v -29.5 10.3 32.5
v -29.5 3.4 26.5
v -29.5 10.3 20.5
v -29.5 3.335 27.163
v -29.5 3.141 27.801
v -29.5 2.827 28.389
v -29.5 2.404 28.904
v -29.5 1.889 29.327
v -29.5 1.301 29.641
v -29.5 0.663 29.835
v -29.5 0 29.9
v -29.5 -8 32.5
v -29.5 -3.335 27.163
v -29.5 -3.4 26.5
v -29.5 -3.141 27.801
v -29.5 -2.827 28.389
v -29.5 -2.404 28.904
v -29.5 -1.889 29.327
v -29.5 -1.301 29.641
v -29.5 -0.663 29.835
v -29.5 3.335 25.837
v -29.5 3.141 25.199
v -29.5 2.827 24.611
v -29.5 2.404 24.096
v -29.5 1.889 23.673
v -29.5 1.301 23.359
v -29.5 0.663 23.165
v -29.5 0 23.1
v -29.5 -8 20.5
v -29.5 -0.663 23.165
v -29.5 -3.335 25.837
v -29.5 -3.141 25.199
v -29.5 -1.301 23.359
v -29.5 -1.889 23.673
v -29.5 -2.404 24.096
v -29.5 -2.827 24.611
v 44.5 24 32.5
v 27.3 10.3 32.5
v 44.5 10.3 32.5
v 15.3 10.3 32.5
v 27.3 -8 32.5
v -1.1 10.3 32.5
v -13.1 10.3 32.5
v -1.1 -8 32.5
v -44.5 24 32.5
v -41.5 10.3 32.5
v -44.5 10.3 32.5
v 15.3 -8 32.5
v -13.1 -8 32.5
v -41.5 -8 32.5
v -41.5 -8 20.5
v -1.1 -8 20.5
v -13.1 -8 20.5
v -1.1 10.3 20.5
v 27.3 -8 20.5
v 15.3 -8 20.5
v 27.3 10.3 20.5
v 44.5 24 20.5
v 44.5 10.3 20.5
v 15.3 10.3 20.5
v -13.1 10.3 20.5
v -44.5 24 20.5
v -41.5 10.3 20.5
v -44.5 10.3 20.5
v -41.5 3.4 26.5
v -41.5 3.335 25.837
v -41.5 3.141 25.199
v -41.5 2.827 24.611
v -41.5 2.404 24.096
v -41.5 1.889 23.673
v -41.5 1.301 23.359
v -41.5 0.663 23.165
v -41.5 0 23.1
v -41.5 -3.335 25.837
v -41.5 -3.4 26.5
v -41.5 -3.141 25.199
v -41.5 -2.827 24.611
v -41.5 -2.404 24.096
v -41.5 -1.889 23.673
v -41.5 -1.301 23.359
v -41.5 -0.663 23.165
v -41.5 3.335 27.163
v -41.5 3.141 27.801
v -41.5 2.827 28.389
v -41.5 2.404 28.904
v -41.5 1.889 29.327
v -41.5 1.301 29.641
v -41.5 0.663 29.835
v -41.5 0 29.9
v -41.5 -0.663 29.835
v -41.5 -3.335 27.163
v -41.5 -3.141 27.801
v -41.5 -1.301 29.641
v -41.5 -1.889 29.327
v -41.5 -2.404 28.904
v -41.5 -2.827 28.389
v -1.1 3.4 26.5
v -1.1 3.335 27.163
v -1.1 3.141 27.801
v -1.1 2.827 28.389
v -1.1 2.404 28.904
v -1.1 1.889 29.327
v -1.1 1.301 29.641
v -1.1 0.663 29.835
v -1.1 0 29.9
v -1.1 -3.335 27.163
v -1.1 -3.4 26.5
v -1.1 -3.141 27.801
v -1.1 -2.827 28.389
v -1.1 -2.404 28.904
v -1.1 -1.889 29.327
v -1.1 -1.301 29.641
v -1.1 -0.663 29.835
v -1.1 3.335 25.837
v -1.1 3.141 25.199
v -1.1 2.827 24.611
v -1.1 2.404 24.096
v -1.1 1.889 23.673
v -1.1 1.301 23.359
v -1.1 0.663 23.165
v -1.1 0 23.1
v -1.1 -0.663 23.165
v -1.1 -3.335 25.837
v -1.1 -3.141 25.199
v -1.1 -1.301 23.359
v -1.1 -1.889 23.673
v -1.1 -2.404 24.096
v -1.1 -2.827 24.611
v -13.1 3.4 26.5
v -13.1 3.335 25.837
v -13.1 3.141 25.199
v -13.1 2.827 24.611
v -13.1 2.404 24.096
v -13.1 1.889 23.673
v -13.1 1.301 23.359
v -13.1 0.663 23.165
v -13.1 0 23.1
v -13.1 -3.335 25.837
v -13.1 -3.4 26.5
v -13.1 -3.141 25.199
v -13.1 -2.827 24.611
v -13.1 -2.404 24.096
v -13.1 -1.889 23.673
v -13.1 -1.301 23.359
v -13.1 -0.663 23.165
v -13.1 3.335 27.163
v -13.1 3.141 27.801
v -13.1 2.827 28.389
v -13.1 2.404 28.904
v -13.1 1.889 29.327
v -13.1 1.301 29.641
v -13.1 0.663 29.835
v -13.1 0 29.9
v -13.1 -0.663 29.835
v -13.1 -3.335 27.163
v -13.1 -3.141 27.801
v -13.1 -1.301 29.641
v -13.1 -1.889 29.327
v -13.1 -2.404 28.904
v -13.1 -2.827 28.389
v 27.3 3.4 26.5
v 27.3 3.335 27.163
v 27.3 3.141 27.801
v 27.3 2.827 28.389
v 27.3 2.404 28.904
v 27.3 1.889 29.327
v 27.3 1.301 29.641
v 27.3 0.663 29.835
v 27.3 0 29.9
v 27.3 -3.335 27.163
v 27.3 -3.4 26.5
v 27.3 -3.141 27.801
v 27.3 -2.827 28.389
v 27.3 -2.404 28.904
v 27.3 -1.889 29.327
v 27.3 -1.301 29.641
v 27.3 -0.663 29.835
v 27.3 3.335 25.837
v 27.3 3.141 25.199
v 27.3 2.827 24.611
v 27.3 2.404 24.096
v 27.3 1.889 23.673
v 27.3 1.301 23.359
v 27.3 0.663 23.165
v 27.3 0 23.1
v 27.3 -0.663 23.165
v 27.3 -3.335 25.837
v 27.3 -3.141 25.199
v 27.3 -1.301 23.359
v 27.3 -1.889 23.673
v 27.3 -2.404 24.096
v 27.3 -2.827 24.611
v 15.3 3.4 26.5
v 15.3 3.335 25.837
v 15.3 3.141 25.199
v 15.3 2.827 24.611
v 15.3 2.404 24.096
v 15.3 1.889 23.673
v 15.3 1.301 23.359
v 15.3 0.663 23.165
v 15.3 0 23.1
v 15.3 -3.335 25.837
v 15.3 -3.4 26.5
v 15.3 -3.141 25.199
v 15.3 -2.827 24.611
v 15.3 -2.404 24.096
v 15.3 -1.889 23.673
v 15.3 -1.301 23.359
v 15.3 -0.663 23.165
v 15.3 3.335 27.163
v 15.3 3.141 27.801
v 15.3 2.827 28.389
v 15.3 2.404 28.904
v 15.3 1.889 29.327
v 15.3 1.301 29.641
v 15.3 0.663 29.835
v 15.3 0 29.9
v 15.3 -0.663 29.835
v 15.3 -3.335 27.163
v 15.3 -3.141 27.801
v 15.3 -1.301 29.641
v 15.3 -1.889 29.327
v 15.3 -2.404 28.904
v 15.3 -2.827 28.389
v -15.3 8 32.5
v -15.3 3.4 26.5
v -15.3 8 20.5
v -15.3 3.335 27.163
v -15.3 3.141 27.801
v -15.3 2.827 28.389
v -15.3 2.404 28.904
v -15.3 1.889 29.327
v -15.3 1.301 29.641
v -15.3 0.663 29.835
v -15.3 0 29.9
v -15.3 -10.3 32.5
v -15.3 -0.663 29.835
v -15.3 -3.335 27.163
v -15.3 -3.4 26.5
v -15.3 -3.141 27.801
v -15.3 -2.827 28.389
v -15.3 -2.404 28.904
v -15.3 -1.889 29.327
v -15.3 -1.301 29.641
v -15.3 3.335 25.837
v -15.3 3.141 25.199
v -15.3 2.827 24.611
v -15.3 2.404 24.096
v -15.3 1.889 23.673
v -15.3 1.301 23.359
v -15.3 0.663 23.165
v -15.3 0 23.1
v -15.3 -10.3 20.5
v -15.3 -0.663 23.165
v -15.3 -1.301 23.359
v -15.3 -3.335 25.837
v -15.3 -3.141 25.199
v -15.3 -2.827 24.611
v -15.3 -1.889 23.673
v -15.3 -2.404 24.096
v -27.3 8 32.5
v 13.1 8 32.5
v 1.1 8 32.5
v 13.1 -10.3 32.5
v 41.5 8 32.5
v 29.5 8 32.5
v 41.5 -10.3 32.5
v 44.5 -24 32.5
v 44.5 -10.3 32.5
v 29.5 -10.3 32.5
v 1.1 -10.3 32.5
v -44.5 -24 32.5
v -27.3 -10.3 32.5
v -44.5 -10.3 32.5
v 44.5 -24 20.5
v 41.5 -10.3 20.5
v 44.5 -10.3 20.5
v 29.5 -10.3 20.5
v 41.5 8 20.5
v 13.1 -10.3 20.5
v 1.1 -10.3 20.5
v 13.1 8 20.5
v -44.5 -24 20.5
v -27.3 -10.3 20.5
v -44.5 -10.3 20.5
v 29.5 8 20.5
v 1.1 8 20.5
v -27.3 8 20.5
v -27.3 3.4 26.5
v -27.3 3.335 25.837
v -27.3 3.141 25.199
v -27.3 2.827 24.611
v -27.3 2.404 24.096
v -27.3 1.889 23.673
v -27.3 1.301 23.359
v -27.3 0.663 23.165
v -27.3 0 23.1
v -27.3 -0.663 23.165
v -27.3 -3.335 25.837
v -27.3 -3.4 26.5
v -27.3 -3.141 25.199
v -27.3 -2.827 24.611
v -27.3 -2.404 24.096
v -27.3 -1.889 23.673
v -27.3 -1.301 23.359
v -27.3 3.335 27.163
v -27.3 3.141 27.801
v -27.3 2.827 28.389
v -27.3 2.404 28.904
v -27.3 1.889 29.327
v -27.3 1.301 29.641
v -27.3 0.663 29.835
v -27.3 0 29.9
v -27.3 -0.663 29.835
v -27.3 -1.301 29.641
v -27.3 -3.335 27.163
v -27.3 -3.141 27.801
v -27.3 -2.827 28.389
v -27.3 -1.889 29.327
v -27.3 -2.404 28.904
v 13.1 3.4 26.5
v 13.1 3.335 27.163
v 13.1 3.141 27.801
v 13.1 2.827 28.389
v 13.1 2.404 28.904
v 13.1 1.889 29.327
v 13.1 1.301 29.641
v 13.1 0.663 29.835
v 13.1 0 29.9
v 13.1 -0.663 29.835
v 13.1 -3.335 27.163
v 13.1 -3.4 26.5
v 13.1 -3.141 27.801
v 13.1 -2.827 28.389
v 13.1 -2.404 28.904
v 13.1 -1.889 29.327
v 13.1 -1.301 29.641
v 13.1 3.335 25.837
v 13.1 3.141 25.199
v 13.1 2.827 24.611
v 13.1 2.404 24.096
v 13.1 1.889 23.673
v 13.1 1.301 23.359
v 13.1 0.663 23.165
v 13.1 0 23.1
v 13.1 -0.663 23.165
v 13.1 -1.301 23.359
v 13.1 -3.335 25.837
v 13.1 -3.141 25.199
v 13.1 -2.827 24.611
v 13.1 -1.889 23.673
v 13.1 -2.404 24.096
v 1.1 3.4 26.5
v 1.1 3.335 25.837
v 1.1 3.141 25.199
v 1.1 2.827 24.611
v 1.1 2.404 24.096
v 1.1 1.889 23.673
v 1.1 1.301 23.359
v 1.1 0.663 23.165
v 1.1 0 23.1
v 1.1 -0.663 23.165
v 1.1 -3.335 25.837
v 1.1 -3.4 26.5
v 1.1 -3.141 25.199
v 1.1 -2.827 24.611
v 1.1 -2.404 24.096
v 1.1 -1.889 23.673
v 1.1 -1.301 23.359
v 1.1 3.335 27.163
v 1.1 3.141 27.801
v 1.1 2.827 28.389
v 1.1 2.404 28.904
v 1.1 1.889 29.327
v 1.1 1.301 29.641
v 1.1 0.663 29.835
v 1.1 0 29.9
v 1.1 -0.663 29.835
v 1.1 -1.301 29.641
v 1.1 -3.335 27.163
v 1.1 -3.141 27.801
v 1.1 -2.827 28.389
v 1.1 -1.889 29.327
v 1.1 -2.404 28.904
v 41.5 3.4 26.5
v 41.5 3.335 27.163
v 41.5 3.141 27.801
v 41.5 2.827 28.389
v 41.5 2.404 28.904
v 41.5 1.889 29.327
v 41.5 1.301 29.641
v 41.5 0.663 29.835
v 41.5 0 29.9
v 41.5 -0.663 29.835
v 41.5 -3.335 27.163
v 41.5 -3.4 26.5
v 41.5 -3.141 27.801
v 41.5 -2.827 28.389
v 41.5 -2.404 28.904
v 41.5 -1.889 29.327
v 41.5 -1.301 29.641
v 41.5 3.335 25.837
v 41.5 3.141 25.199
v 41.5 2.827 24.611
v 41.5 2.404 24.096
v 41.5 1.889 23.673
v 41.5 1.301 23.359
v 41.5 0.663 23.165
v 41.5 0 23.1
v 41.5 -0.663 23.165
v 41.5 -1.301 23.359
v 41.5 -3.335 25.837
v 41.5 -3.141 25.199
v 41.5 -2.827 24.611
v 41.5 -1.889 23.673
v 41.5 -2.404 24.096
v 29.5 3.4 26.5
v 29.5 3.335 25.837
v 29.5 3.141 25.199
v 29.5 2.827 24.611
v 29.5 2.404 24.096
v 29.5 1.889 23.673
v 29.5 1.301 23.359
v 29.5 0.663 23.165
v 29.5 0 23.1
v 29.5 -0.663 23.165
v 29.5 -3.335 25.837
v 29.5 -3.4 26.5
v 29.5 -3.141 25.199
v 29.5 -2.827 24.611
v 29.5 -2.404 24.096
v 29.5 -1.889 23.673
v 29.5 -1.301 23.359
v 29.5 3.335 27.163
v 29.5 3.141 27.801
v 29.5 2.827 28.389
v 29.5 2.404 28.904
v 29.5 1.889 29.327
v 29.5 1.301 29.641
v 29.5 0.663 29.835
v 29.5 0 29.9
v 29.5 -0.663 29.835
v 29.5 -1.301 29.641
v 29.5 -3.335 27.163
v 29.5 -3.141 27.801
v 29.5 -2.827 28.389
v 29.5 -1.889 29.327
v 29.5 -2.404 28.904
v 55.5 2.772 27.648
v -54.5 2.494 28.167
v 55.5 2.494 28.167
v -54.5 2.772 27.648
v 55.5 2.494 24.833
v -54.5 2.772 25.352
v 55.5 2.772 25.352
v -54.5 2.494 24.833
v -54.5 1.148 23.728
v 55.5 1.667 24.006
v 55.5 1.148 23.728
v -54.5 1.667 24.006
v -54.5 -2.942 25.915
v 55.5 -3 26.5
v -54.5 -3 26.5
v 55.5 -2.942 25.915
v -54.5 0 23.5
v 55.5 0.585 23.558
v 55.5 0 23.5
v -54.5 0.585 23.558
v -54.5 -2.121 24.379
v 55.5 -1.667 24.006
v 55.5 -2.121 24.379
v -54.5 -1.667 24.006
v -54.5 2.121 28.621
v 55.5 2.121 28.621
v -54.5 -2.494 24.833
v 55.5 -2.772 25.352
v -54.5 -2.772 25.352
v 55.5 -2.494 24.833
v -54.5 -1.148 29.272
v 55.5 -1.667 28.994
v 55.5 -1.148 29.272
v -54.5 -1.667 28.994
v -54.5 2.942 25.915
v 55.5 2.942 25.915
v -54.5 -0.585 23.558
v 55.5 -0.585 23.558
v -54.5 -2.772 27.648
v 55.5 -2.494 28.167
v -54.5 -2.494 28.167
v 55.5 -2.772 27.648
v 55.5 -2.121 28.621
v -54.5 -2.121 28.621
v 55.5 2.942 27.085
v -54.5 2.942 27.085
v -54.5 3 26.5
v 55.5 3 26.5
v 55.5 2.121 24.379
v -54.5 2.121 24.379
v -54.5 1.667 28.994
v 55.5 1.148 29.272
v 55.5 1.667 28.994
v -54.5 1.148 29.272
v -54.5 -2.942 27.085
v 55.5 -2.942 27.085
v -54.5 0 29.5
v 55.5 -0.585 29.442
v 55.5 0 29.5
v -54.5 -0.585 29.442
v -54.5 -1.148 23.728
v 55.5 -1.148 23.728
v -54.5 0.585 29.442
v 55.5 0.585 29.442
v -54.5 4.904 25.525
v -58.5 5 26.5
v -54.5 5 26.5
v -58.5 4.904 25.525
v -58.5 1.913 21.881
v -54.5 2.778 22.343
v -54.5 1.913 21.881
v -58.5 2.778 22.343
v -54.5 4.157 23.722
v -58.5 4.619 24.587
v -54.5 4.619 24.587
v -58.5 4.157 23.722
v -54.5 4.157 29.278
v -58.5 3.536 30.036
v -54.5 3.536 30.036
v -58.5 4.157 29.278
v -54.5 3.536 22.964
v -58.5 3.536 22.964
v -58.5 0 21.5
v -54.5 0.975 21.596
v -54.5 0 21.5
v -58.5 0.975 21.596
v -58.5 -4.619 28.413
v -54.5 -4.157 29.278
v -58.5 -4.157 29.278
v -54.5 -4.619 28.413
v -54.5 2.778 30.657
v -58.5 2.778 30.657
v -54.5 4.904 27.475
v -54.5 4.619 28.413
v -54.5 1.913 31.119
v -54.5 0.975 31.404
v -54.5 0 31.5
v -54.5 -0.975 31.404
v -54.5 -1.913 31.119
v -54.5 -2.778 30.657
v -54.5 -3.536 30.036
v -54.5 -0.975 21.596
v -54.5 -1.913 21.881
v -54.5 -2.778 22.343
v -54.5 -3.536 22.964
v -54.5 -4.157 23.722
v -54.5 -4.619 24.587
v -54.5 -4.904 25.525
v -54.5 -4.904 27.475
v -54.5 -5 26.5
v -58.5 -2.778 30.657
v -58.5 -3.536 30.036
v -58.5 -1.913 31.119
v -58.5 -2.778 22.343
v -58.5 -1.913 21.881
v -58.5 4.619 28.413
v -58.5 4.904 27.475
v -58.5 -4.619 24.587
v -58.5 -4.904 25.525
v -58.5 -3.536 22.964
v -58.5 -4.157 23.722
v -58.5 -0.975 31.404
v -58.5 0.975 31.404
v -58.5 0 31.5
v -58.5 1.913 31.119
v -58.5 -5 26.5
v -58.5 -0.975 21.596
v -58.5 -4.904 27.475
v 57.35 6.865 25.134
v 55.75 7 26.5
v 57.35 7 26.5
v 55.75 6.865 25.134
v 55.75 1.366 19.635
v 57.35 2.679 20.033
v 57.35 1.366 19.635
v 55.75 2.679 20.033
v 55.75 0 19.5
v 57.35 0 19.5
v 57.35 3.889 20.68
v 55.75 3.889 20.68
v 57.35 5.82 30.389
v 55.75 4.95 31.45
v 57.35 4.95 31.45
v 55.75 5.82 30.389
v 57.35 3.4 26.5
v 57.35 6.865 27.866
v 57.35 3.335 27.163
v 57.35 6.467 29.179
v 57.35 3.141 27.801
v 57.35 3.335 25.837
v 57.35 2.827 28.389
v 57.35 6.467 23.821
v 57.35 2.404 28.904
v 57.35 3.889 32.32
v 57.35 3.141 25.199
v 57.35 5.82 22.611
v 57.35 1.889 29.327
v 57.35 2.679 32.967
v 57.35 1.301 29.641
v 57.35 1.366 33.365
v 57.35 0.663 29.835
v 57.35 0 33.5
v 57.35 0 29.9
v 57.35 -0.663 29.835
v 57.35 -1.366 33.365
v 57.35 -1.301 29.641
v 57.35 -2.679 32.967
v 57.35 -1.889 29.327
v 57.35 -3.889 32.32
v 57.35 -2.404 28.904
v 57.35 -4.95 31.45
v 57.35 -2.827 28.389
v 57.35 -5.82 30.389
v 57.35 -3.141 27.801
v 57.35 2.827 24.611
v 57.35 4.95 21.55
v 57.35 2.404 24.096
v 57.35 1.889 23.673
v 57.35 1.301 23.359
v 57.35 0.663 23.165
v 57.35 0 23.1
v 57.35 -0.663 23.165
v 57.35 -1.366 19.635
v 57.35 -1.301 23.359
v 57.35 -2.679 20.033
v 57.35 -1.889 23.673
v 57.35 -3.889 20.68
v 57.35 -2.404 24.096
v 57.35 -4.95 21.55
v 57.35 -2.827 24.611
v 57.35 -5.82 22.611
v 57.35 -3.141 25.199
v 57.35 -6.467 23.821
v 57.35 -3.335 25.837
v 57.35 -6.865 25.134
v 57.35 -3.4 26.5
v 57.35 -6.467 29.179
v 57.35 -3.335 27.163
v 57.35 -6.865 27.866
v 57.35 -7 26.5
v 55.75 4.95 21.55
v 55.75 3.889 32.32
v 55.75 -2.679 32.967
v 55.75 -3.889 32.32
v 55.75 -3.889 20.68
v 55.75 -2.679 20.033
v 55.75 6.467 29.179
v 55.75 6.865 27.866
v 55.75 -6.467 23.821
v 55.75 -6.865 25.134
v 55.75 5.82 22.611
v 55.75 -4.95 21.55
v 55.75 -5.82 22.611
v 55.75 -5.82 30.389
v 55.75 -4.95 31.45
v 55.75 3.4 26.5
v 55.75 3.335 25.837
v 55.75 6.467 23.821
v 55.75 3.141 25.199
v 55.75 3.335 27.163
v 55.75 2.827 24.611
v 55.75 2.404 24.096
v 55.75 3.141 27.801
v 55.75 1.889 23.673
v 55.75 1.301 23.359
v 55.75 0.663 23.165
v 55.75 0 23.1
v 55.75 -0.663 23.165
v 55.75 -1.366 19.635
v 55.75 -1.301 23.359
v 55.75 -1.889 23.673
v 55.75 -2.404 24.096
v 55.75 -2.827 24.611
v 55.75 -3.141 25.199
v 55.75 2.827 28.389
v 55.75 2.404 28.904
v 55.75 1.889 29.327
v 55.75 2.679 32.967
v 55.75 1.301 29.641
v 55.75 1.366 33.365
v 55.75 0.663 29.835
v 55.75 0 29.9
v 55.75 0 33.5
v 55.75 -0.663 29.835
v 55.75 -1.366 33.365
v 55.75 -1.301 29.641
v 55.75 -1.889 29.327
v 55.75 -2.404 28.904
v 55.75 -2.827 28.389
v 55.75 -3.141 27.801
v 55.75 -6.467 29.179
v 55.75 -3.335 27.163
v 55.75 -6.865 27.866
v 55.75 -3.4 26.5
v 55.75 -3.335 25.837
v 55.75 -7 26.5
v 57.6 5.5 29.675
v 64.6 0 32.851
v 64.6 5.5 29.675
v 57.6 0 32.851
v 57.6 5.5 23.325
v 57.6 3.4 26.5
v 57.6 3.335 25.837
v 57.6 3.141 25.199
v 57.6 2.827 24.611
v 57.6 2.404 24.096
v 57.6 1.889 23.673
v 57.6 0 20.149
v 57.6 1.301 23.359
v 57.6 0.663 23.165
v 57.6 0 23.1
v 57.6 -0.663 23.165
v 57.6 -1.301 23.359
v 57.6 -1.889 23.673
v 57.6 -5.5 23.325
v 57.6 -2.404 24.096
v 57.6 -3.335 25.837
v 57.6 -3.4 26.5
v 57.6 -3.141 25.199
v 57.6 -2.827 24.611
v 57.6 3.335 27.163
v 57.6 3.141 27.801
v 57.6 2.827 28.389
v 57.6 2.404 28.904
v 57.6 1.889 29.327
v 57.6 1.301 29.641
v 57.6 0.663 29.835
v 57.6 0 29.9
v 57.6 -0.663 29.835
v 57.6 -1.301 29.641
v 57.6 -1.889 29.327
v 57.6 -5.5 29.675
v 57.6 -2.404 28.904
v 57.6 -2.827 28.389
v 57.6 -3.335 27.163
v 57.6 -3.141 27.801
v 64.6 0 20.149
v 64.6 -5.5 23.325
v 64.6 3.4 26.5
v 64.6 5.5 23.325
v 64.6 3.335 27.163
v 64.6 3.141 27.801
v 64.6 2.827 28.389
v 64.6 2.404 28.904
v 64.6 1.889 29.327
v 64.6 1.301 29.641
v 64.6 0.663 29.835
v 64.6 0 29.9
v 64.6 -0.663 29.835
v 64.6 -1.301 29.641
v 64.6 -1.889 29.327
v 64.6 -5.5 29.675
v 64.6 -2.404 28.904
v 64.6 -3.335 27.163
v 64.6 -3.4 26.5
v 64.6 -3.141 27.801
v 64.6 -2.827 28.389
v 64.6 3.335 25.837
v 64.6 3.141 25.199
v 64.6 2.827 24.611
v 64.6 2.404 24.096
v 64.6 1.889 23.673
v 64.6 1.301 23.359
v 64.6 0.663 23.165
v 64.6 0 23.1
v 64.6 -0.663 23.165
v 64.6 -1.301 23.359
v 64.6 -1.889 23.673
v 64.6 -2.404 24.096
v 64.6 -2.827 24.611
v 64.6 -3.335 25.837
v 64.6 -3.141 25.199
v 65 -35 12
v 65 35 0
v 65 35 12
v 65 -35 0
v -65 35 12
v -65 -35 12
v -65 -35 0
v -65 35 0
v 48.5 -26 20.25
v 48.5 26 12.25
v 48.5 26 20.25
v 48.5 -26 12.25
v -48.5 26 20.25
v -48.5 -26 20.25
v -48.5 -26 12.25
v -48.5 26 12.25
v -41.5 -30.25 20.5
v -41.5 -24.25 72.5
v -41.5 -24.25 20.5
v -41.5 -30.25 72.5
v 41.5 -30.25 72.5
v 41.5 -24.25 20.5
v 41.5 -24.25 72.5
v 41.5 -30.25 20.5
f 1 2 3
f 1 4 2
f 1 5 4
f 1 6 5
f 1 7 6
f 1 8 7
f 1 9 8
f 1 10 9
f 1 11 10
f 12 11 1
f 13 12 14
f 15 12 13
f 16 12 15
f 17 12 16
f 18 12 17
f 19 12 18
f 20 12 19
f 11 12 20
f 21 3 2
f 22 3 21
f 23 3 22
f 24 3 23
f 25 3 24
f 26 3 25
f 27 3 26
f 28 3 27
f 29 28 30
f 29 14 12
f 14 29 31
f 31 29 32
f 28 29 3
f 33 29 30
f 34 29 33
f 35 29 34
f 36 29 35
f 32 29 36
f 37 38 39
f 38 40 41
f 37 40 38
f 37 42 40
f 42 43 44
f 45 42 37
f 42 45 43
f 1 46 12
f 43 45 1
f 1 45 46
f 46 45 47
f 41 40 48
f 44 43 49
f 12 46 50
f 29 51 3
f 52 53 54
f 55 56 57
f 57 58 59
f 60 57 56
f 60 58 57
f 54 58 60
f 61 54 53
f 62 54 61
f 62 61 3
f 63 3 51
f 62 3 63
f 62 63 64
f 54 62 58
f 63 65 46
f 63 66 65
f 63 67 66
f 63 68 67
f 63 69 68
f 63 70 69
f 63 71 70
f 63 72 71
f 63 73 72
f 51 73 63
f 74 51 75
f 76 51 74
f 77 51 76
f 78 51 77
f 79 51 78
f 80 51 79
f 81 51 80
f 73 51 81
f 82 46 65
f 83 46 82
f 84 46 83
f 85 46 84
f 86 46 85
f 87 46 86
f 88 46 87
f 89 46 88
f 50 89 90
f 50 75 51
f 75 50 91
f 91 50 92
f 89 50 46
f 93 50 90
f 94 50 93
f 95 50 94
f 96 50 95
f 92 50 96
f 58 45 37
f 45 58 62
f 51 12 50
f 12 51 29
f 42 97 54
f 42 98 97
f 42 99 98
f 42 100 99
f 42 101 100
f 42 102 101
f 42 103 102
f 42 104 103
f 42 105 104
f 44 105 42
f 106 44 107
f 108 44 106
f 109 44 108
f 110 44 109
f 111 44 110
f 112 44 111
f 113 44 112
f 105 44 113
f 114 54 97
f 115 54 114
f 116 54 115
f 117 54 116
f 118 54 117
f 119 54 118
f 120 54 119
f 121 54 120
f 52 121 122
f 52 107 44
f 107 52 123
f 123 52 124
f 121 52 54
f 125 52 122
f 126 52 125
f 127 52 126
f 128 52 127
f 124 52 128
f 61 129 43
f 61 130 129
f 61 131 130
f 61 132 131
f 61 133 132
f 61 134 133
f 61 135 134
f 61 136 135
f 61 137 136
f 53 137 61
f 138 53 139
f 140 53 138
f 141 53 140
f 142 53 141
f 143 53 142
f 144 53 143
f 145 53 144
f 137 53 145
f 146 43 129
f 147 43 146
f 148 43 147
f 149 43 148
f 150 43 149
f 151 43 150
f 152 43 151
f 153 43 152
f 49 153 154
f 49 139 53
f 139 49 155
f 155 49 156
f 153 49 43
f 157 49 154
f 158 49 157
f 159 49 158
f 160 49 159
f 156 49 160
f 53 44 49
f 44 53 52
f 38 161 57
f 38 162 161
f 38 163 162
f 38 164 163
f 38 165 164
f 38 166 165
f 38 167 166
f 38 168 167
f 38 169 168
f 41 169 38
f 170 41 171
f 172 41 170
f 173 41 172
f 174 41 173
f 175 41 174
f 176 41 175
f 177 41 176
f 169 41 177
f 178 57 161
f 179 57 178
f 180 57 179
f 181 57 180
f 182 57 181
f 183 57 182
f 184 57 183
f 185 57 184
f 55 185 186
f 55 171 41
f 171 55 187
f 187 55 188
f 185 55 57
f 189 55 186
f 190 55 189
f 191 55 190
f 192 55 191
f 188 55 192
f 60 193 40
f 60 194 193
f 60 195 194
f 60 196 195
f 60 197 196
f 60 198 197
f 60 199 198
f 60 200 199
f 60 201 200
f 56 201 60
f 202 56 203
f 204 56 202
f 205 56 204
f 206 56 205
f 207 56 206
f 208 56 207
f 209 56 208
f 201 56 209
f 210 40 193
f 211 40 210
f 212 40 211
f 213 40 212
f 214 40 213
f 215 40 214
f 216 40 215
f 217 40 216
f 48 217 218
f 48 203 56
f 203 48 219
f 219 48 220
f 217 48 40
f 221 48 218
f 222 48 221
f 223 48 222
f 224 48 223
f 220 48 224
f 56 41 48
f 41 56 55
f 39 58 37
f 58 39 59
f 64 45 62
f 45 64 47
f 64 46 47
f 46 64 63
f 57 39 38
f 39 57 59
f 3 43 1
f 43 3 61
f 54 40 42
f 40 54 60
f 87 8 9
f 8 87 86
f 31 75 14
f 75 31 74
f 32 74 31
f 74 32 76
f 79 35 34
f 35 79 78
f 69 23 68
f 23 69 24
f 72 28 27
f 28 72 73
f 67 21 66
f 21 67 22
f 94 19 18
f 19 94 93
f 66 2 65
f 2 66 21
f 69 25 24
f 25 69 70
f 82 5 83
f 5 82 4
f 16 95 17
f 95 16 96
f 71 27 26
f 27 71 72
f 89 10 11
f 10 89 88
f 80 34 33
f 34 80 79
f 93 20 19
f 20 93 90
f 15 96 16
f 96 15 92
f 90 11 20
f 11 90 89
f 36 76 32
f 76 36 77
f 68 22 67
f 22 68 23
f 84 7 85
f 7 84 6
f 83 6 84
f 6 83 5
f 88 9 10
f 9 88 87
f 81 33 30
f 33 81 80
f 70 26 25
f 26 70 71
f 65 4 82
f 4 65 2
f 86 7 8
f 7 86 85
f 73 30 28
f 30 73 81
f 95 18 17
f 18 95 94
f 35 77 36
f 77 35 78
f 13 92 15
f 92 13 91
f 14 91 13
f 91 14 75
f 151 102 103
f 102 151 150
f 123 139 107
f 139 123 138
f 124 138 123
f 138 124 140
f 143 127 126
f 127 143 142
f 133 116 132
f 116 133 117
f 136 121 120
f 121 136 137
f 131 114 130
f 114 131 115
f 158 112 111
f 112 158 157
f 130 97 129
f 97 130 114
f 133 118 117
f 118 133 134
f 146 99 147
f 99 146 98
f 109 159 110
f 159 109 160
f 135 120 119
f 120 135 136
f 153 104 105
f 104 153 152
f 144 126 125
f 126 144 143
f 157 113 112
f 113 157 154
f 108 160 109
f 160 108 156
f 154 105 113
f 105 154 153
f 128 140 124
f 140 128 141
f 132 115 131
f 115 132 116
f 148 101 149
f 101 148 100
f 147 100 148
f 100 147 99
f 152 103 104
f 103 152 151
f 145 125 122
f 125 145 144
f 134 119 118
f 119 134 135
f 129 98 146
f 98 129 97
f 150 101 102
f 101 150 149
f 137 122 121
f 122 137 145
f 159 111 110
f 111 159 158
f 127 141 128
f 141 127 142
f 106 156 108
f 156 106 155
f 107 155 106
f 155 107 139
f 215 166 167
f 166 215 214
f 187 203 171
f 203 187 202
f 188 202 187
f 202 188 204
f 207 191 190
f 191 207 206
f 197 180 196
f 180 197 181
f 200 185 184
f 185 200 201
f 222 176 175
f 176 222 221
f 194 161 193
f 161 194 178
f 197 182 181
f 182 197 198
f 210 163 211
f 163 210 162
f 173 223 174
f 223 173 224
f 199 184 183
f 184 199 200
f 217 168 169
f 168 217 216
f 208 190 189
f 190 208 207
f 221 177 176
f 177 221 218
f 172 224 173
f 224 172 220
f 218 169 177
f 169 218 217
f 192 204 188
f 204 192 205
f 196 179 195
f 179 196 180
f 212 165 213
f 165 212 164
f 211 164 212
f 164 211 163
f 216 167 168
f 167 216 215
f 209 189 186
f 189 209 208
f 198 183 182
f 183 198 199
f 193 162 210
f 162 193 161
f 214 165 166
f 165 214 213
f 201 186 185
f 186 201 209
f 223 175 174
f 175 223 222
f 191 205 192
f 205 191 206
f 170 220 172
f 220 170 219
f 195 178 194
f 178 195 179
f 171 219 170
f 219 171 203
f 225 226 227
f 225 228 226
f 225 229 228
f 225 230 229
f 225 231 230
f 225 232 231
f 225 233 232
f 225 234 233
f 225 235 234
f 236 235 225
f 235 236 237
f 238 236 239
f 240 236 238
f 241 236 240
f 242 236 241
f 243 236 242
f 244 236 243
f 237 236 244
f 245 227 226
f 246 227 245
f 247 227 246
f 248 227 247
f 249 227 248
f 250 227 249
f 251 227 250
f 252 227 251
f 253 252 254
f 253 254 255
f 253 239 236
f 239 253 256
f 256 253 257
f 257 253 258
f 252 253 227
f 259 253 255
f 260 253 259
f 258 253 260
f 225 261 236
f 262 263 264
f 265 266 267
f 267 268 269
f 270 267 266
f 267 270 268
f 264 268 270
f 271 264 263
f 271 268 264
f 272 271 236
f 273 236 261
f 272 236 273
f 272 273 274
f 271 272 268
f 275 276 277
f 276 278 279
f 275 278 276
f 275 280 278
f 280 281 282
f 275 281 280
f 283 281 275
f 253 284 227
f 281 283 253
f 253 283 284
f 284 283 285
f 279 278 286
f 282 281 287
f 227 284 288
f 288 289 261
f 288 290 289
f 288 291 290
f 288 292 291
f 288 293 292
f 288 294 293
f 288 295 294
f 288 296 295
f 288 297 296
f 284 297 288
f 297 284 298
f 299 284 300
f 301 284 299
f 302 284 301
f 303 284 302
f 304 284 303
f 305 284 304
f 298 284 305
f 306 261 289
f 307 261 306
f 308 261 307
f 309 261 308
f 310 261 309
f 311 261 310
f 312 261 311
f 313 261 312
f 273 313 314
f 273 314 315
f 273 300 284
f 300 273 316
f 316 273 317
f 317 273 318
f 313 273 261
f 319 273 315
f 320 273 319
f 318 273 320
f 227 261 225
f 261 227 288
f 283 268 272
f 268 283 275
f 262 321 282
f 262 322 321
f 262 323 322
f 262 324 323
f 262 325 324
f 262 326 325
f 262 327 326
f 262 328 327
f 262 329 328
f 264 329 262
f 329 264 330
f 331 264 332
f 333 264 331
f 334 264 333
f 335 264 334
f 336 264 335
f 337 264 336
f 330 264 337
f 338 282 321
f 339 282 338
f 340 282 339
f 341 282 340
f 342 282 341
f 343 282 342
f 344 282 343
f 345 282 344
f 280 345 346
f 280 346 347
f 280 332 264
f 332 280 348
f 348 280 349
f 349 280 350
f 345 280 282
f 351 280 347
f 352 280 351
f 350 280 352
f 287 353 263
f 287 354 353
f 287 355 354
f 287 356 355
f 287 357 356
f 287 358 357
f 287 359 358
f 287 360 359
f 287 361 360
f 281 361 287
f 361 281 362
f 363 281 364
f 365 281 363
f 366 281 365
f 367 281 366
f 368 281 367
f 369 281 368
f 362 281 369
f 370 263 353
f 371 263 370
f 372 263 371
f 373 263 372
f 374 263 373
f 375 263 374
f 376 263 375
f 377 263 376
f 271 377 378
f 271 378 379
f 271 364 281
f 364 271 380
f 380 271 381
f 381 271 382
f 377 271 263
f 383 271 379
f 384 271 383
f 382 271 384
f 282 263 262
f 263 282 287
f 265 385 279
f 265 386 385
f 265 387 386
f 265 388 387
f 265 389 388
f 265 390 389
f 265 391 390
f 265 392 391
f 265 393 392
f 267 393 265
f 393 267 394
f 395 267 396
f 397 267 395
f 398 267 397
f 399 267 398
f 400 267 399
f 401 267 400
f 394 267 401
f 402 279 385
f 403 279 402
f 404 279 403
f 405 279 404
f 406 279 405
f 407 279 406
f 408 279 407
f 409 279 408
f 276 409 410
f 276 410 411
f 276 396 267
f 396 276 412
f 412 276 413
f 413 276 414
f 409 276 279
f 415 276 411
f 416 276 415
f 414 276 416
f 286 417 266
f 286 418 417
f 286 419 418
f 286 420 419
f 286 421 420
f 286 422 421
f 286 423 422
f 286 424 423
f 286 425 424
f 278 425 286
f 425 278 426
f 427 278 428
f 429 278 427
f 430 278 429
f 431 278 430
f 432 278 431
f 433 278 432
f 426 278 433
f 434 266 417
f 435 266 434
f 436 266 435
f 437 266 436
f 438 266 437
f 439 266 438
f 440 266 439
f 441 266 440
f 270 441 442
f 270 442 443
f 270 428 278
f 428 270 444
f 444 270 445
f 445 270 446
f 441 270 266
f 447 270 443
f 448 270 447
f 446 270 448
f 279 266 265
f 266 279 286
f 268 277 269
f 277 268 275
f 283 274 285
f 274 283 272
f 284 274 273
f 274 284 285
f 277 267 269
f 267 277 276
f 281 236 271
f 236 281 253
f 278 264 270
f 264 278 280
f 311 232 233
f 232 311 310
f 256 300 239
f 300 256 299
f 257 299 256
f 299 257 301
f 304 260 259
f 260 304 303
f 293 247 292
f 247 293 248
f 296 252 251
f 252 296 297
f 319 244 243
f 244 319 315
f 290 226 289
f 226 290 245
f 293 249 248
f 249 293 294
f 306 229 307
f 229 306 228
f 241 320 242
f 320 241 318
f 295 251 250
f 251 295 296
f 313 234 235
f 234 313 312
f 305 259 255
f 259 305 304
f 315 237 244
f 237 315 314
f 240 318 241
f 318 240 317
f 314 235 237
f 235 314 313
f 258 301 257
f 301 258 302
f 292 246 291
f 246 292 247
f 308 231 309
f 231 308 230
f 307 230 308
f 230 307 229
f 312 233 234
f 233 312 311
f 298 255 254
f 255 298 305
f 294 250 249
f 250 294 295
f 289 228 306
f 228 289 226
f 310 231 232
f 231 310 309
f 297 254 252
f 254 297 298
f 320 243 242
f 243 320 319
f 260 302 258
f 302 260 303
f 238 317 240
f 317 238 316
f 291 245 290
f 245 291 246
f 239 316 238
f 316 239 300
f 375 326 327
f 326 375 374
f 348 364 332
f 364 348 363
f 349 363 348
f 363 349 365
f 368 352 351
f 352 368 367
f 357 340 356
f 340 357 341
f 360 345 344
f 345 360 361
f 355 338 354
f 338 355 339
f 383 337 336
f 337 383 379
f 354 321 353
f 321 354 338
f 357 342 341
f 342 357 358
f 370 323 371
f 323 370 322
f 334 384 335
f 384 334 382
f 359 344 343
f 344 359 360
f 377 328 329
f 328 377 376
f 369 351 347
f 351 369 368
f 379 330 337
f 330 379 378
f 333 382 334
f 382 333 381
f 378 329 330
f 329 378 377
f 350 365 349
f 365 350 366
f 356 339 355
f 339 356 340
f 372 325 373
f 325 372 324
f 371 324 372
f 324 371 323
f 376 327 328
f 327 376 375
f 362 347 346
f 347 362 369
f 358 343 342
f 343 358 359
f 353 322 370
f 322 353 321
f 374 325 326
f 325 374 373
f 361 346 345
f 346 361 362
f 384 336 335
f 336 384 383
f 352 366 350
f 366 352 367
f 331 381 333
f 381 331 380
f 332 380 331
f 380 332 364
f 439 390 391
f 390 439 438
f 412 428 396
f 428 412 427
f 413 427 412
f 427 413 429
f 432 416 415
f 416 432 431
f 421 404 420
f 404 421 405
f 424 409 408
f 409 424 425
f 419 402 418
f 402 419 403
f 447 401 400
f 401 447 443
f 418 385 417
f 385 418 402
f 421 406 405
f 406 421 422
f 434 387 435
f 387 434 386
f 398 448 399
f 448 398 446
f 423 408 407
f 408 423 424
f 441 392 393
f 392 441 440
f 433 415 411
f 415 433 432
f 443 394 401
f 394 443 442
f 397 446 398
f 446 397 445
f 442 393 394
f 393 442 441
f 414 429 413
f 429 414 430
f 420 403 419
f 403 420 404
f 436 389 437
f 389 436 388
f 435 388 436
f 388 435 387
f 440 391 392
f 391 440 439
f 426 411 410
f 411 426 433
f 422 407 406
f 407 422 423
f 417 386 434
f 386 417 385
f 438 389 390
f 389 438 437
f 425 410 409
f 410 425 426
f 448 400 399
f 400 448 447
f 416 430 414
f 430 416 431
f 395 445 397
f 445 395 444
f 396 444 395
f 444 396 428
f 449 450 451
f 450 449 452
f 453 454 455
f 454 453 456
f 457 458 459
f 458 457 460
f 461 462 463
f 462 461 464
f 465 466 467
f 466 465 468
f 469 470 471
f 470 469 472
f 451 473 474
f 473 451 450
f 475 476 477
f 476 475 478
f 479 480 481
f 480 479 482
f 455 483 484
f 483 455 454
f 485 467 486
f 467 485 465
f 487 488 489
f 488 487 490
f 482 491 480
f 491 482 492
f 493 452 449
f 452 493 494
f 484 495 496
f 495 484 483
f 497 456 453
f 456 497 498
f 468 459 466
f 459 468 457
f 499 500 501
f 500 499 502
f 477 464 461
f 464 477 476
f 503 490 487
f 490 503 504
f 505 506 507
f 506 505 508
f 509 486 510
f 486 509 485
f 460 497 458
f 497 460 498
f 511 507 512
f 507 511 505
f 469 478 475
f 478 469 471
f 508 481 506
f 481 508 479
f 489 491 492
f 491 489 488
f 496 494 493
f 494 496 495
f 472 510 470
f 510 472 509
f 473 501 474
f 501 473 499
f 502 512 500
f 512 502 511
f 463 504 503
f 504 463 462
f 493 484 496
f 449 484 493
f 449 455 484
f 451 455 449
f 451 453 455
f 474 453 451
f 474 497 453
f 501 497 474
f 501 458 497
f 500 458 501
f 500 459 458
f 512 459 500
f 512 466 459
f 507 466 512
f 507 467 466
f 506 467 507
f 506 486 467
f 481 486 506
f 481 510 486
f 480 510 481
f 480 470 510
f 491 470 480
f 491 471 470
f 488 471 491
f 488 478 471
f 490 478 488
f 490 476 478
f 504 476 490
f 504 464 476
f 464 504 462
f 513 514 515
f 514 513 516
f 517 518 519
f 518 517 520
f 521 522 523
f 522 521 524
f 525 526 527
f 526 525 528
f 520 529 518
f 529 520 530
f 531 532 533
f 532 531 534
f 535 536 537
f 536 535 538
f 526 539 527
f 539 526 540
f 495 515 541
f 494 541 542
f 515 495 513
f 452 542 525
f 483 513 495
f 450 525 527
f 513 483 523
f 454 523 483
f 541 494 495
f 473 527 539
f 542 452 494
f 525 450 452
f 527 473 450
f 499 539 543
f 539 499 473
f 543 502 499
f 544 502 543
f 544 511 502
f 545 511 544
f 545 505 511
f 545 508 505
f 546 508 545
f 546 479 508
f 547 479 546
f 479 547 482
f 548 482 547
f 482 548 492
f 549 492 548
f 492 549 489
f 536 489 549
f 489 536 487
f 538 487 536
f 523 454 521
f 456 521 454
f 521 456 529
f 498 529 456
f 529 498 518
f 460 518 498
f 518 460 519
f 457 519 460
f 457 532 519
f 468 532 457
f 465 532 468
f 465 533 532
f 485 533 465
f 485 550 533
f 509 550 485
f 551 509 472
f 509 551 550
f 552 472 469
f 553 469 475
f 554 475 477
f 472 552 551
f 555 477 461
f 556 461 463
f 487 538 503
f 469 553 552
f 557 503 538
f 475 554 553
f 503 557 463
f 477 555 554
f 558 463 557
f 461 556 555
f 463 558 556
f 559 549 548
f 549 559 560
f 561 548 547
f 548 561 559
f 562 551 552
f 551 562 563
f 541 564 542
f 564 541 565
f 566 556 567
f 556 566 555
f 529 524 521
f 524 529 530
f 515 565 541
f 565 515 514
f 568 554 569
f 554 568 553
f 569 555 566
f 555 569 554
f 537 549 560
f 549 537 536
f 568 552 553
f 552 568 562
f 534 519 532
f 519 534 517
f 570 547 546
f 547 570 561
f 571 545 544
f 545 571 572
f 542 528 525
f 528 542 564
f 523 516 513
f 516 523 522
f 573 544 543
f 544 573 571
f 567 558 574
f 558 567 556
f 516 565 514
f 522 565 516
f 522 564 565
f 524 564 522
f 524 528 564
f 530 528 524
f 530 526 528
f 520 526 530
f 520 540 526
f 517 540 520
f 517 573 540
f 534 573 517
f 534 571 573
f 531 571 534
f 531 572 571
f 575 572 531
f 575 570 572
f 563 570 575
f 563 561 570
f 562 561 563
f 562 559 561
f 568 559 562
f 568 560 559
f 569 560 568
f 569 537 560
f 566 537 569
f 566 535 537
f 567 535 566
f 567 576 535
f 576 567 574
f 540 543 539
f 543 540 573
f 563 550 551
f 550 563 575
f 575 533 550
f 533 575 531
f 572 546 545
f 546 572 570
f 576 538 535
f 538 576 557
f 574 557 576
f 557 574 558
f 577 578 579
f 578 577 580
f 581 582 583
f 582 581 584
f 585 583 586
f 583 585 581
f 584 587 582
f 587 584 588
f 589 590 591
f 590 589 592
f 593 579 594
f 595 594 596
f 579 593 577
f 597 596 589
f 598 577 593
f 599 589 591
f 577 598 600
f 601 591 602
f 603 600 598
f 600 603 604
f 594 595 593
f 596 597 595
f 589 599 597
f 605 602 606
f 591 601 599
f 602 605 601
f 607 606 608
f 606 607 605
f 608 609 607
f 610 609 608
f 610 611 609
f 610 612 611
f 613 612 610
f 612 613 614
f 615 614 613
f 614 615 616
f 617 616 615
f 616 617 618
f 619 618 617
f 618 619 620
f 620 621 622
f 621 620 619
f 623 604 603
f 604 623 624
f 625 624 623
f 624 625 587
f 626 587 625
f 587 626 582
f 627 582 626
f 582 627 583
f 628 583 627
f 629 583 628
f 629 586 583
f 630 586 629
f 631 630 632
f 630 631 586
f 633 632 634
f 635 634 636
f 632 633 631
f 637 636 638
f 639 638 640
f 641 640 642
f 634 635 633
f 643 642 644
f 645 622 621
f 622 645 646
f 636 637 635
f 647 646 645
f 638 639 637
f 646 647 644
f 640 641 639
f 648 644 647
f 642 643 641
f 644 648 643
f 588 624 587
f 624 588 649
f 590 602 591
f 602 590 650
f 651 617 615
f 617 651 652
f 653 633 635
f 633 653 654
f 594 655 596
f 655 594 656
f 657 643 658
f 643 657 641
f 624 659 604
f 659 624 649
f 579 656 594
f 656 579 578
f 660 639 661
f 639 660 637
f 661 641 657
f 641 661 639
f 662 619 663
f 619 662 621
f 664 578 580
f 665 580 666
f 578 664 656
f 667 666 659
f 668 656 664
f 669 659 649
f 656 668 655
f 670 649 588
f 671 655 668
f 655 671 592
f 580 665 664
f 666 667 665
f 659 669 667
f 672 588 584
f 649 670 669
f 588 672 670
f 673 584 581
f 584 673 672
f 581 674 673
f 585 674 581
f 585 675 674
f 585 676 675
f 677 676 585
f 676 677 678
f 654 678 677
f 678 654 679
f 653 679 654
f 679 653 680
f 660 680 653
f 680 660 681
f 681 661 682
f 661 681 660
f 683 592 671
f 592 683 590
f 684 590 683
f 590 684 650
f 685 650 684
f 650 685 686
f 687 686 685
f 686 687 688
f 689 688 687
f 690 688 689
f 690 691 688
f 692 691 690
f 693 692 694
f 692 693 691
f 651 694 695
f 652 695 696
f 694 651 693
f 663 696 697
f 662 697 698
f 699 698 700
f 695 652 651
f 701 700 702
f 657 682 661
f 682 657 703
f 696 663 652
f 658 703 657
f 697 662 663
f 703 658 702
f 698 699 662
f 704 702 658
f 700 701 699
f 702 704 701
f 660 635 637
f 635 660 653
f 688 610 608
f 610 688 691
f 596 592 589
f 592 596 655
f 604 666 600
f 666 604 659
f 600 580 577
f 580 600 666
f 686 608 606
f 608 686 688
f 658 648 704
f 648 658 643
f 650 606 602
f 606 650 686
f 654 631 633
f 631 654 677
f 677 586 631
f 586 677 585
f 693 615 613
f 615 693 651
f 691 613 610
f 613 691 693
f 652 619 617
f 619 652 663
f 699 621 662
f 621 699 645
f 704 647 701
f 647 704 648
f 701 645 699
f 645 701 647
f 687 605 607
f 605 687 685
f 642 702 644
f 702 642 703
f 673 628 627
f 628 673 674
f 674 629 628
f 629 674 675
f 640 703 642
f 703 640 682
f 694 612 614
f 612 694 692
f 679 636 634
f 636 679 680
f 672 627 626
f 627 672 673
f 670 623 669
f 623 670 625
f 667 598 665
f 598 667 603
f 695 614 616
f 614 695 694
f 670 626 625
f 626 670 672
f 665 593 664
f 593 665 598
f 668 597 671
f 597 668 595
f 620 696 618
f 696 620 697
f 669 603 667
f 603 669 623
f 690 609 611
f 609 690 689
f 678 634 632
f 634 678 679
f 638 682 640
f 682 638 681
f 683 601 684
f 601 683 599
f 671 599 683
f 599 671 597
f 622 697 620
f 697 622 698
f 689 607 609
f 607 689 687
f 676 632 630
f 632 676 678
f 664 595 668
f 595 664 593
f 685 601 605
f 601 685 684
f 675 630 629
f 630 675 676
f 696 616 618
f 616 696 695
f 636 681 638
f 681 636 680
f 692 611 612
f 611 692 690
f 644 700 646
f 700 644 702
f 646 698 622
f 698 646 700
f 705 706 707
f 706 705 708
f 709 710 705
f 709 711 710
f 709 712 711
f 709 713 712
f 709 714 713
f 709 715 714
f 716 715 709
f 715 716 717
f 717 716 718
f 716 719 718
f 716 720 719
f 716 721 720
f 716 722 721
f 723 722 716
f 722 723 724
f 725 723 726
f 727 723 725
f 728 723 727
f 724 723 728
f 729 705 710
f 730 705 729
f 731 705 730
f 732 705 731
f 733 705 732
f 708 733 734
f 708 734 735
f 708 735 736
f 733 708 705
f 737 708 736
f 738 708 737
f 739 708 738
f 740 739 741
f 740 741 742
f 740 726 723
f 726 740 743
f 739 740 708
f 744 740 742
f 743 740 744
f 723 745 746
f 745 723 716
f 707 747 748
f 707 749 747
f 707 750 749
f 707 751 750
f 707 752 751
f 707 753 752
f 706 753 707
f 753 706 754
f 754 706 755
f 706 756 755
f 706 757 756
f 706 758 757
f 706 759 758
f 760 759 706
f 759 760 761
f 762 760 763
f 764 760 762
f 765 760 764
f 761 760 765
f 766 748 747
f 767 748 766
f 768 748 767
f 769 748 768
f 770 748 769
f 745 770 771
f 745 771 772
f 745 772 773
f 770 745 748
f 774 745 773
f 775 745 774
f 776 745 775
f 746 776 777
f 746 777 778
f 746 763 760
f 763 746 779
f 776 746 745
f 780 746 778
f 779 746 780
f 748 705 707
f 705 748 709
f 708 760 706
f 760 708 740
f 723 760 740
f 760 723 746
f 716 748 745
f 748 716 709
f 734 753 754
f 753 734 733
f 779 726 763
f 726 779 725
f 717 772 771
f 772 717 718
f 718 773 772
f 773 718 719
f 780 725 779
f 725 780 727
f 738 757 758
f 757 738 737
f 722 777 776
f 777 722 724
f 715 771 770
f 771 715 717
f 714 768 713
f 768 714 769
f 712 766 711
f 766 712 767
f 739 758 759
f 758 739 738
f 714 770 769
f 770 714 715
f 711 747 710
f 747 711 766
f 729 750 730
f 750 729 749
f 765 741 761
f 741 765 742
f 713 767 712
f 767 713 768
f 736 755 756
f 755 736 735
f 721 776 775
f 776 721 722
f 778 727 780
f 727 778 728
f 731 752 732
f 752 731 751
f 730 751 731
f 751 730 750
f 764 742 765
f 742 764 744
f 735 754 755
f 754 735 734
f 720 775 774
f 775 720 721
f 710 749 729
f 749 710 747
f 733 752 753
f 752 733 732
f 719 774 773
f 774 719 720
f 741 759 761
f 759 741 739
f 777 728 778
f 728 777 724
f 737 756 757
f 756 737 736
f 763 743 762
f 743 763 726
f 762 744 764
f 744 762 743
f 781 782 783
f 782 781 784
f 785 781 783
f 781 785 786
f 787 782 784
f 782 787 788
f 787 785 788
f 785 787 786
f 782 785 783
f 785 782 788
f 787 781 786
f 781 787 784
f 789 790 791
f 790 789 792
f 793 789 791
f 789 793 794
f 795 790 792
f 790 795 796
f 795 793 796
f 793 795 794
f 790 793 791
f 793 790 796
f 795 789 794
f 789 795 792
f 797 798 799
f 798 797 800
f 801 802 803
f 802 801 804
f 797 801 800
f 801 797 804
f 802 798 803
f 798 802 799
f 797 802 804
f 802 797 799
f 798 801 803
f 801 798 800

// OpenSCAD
$fn = 32;

// ------------------------------------------------------------------------
// Comb hinge with flap: leaf 89 x 24 mm, pin d6, flap 52 mm
// Every part is its own module, assembly() places every instance.
// ------------------------------------------------------------------------

// --- part 1 ---
module hinge_bed() {
  difference() {
    translate([-65, -35, 0]) cube([130, 70, 12]);
  }
}

// --- part 2 ---
module hinge_riser() {
  difference() {
    translate([-48.5, -26, 0]) cube([97, 52, 8]);
  }
}

// --- part 3 ---
module hinge_leaf_a() {
  difference() {
    union() {
      translate([-41.5, -8, -6]) cube([12, 32, 12]);
      translate([-13.1, -8, -6]) cube([12, 32, 12]);
      translate([15.3, -8, -6]) cube([12, 32, 12]);
      translate([-44.5, 10.3, -6]) cube([89, 13.7, 12]);
    }
    translate([-35.5, 0, 0]) rotate([0, 90, 0]) cylinder(h = 14, d = 6.8, center = true);
    translate([-7.1, 0, 0]) rotate([0, 90, 0]) cylinder(h = 14, d = 6.8, center = true);
    translate([21.3, 0, 0]) rotate([0, 90, 0]) cylinder(h = 14, d = 6.8, center = true);
  }
}

// --- part 4 ---
module hinge_leaf_b() {
  difference() {
    union() {
      translate([-27.3, -24, -6]) cube([12, 32, 12]);
      translate([1.1, -24, -6]) cube([12, 32, 12]);
      translate([29.5, -24, -6]) cube([12, 32, 12]);
      translate([-44.5, -24, -6]) cube([89, 13.7, 12]);
    }
    translate([-21.3, 0, 0]) rotate([0, 90, 0]) cylinder(h = 14, d = 6.8, center = true);
    translate([7.1, 0, 0]) rotate([0, 90, 0]) cylinder(h = 14, d = 6.8, center = true);
    translate([35.5, 0, 0]) rotate([0, 90, 0]) cylinder(h = 14, d = 6.8, center = true);
  }
}

// --- part 5 ---
module hinge_flap() {
  difference() {
    translate([-41.5, -26, 0]) cube([83, 52, 6]);
  }
}

// --- part 6 ---
module hinge_pin() {
  rotate([0, 90, 0]) cylinder(h = 111, d = 6, center = true);
  translate([-58.5, 0, 0]) rotate([0, 90, 0]) cylinder(h = 4, d = 10);
}

// --- part 7 ---
module pin_washer() {
  difference() {
      translate([0, 0, 0]) cylinder(h = 1.6, d = 14);
      translate([0, 0, -1]) cylinder(h = 3.6, d = 6.8);
    }
}

// --- part 8 ---
module pin_nut() {
  difference() {
    linear_extrude(height = 7) polygon(points = [[6.351, 0], [3.175, 5.5], [-3.175, 5.5], [-6.351, 0], [-3.175, -5.5], [3.175, -5.5]]);
    translate([0, 0, -1]) cylinder(h = 9, d = 6.8);
  }
}

// --- assembly ---
module assembly() {
  color([0.80, 0.24, 0.20]) translate([0, 0, 0]) rotate([0, 0, 0]) hinge_bed();
  color([0.20, 0.45, 0.75]) translate([0, 0, 12.25]) rotate([0, 0, 0]) hinge_riser();
  color([0.25, 0.62, 0.32]) translate([0, 0, 26.5]) rotate([0, 0, 0]) hinge_leaf_a();
  color([0.92, 0.70, 0.18]) translate([0, 0, 26.5]) rotate([0, 0, 0]) hinge_leaf_b();
  color([0.58, 0.35, 0.70]) translate([0, -24.25, 46.5]) rotate([90, 0, 0]) hinge_flap();
  color([0.16, 0.66, 0.66]) translate([0, 0, 26.5]) rotate([0, 0, 0]) hinge_pin();
  color([0.85, 0.48, 0.18]) translate([55.75, 0, 26.5]) rotate([0, 90, 0]) pin_washer();
  color([0.55, 0.60, 0.65]) translate([57.6, 0, 26.5]) rotate([0, 90, 0]) pin_nut();
}

assembly();
